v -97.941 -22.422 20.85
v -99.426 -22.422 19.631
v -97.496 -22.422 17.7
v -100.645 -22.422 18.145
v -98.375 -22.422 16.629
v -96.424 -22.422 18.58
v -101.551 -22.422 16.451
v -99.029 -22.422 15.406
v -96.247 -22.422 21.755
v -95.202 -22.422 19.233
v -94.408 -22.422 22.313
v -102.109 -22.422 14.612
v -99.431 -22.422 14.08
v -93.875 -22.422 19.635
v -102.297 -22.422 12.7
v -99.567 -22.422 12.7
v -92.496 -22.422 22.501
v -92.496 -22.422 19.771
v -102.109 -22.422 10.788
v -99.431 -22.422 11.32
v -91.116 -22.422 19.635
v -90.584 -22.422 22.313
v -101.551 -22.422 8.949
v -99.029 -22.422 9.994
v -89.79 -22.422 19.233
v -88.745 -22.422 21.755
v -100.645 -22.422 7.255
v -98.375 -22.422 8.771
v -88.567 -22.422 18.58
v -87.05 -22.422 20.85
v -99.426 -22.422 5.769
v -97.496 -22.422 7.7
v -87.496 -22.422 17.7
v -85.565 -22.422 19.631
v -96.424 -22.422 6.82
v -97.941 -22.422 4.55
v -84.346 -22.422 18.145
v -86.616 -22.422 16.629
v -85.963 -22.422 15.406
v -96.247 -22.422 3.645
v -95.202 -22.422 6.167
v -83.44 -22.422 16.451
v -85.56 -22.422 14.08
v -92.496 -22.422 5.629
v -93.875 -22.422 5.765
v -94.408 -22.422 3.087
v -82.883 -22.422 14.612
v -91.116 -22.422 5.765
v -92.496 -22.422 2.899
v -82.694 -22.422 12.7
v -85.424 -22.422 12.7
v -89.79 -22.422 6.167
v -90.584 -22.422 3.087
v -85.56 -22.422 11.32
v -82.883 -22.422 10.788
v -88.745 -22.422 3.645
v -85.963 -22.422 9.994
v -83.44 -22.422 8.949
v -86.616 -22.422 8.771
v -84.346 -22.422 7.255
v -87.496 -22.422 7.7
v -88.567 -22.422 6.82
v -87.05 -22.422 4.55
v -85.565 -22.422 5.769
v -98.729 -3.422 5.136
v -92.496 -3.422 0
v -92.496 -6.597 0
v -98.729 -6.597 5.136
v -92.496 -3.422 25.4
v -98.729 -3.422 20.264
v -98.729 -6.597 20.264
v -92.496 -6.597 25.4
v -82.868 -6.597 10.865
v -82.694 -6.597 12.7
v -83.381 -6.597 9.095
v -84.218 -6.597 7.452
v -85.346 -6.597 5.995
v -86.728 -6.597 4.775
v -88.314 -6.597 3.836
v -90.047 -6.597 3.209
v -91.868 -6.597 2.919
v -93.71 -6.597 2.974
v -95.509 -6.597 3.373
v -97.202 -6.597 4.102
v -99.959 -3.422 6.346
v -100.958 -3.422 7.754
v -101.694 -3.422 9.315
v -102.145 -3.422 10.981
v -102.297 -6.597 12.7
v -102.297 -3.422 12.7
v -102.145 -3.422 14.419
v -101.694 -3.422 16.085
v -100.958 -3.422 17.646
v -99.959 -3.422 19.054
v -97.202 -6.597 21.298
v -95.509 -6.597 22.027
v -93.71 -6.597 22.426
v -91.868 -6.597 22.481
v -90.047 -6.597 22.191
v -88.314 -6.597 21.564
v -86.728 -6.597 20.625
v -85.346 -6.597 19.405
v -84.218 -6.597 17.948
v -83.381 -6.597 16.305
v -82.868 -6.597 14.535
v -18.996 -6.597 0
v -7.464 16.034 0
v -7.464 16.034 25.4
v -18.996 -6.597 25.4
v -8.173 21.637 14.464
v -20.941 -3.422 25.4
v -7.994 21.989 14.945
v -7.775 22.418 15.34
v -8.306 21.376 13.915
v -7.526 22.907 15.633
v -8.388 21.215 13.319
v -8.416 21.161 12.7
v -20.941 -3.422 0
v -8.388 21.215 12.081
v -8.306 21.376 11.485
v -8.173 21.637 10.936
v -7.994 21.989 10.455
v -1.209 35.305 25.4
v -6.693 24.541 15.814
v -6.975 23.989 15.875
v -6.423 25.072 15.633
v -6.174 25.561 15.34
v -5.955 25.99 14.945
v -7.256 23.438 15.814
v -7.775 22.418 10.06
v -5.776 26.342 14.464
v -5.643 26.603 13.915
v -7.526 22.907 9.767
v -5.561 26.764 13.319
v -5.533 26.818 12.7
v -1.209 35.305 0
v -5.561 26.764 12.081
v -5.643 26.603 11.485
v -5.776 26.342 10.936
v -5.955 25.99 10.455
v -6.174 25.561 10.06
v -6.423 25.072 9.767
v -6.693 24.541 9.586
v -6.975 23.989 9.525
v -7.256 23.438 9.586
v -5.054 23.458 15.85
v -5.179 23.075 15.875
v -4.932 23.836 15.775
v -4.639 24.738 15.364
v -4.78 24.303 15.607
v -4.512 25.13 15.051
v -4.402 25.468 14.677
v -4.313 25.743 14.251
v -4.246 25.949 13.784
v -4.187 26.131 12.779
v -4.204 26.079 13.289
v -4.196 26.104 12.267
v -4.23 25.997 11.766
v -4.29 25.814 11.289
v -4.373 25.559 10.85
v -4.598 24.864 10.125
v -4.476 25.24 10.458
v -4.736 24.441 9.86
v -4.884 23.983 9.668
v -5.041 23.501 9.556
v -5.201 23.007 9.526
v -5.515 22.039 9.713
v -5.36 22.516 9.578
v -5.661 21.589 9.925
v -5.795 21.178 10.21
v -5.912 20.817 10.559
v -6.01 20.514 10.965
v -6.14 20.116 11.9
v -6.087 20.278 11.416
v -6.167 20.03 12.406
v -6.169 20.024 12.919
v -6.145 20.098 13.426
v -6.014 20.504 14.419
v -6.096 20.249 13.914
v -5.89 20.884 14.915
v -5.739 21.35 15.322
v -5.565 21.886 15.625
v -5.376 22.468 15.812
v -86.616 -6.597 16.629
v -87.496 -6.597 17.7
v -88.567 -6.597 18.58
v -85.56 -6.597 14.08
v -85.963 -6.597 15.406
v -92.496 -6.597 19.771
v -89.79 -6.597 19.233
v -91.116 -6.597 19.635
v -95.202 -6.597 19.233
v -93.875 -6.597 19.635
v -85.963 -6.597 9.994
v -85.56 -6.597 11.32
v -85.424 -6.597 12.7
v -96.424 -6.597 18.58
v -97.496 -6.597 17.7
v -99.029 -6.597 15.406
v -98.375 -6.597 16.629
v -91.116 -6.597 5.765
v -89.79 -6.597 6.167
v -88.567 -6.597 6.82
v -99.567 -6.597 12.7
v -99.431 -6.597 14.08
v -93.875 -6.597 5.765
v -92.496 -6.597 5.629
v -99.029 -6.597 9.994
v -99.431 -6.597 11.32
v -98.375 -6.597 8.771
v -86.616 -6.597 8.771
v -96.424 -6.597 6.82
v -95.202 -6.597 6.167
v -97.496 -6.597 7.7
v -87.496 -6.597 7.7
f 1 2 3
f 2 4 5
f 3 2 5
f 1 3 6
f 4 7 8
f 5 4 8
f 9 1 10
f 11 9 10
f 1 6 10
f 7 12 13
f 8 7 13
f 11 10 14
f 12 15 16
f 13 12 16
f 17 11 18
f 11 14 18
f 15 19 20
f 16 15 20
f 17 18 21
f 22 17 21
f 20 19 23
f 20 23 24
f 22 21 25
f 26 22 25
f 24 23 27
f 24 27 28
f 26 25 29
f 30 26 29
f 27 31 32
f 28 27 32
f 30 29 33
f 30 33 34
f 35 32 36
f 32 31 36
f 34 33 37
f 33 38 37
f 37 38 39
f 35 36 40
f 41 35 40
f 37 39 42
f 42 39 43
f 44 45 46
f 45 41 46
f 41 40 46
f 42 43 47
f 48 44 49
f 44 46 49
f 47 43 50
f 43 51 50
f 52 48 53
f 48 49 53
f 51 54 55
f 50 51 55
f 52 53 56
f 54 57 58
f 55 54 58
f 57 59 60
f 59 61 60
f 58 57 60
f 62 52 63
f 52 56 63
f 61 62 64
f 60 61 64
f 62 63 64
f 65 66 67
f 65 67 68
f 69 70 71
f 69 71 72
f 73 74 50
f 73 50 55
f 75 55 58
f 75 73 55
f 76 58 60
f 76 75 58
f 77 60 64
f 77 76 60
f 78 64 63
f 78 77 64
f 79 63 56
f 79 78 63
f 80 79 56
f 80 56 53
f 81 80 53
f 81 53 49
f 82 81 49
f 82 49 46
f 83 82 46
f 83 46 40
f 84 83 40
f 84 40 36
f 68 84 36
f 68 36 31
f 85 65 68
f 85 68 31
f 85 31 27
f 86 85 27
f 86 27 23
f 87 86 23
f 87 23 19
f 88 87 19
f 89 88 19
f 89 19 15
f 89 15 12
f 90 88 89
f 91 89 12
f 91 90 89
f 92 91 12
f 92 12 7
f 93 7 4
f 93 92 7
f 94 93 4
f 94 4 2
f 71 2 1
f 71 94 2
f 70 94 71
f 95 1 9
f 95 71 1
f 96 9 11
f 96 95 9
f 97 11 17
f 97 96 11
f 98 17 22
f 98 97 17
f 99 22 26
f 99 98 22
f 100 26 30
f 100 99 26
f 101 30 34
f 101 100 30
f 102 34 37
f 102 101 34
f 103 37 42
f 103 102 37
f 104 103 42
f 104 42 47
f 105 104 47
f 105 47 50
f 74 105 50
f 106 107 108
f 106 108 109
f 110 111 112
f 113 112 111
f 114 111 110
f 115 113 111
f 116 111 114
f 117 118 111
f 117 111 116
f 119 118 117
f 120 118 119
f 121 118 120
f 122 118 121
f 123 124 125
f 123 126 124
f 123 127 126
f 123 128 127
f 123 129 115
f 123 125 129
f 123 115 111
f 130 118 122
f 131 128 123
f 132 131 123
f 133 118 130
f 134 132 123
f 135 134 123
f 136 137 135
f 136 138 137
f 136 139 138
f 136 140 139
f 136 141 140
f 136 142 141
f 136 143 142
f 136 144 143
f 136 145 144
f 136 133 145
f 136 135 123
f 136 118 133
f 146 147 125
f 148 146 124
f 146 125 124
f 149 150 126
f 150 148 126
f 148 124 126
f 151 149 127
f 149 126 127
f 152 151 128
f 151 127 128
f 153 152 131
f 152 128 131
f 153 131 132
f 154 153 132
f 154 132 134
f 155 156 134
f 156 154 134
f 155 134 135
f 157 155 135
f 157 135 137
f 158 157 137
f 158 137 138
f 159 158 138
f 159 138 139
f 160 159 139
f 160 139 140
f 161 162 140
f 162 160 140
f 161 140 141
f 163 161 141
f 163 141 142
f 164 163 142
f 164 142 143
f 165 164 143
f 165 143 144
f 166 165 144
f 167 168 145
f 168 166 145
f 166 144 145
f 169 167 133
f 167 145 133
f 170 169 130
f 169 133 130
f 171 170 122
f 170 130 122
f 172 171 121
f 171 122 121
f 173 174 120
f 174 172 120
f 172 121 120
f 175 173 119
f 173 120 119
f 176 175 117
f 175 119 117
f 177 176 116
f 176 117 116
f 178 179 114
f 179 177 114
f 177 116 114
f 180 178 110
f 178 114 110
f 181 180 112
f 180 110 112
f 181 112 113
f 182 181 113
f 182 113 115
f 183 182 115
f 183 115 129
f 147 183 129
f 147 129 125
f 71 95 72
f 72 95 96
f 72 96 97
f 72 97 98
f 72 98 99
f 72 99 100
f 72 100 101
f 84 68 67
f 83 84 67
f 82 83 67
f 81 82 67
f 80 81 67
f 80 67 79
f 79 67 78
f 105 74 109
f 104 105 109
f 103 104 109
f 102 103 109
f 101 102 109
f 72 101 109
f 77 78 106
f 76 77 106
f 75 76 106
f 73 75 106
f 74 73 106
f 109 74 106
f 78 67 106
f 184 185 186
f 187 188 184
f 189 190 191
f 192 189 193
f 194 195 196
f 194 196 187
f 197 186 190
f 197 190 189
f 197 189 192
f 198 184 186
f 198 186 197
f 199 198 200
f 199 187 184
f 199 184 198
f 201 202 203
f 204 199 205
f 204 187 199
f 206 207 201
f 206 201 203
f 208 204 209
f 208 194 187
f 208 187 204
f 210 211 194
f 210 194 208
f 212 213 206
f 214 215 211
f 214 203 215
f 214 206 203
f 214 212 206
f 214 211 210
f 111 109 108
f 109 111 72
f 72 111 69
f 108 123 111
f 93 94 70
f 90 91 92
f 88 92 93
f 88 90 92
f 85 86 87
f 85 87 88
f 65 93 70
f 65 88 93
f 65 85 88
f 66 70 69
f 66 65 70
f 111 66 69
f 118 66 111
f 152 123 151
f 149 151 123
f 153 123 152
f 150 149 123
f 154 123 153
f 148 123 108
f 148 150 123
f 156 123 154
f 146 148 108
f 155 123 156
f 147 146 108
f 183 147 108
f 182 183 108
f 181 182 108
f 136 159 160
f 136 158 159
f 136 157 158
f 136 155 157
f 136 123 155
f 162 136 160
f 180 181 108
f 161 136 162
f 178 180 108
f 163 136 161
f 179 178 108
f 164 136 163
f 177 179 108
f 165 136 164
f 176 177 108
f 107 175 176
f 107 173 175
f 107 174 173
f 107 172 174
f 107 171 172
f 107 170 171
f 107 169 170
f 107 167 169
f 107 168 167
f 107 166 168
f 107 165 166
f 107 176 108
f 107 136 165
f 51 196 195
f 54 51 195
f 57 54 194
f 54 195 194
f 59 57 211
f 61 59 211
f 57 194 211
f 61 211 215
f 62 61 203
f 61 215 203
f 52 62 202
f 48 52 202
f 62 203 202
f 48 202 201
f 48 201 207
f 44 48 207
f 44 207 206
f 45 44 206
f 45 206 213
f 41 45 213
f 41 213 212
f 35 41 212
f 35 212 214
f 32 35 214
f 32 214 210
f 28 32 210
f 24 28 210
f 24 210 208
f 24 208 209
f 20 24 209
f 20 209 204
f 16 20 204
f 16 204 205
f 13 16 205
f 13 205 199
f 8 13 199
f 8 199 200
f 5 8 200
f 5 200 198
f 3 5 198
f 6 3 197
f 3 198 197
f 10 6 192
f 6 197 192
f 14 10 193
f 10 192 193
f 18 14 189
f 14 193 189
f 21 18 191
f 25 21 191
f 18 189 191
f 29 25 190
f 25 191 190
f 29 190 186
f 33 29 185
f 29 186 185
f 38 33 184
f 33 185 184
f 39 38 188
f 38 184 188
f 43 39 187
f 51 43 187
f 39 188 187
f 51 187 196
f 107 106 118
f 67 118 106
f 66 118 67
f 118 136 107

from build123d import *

# Parameters (mm, degrees)
BOSS_EXTRUDE1_DEPTH = 25.4
SKETCH2_R           = 9.801448676
SKETCH2_R_2         = 7.071368029
BOSS_EXTRUDE2_DEPTH = 19
BOSS_EXTRUDE3_DEPTH = 3.175
SKETCH4_R           = 3.175
CUT_EXTRUDE1_DEPTH  = 3.175


with BuildPart() as part:
    # Sketch1 → Boss-Extrude1 (new body)
    with BuildSketch(Plane.XY):
        Polygon((-92.495819173, -3.422180745), (-20.941461675, -3.422180745), (-1.20885062, 35.305249012), (-7.464460479, 16.03438497), (-18.995819173, -6.597180745), (-92.495819173, -6.597180745), align=None)
    extrude(amount=BOSS_EXTRUDE1_DEPTH)

    # Sketch2 → Boss-Extrude2 (add)
    with BuildSketch(Plane(origin=(0, -3.422180745, 0), x_dir=(1, 0, 0), z_dir=(0, 1, 0))):
        with Locations((-92.495819173, -12.7)):
            Circle(SKETCH2_R)
        with Locations((-92.495819173, -12.7)):
            Circle(SKETCH2_R_2, mode=Mode.SUBTRACT)
    extrude(amount=-BOSS_EXTRUDE2_DEPTH)

    # Sketch3 → Boss-Extrude3 (add)
    with BuildSketch(Plane(origin=(0, -3.422180745, 0), x_dir=(1, 0, 0), z_dir=(0, 1, 0))):
        with BuildLine():
            Line((-98.728601618, -16.040159995), (-98.728601618, -9.359840005))
            ThreePointArc((-98.728601618, -9.359840005), (-99.567187202, -12.7), (-98.728601618, -16.040159995))
        make_face()
        with BuildLine():
            Line((-98.728601618, -9.359840005), (-98.728601618, -5.135555597))
            Line((-98.728601618, -5.135555597), (-102.297267848, -12.7))
            Line((-102.297267848, -12.7), (-98.728601618, -20.264444403))
            Line((-98.728601618, -20.264444403), (-98.728601618, -16.040159995))
            ThreePointArc((-98.728601618, -16.040159995), (-99.567187202, -12.7), (-98.728601618, -9.359840005))
        make_face()
        with BuildLine():
            ThreePointArc((-92.495819173, -2.898551324), (-95.806852438, -3.474738223), (-98.728601618, -5.135555597))
            Line((-98.728601618, -5.135555597), (-98.728601618, -9.359840005))
            ThreePointArc((-98.728601618, -9.359840005), (-96.12794976, -6.632721104), (-92.495819173, -5.628631971))
            Line((-92.495819173, -5.628631971), (-92.495819173, -2.898551324))
        make_face()
        with BuildLine():
            ThreePointArc((-92.495819173, -19.771368029), (-96.12794976, -18.767278896), (-98.728601618, -16.040159995))
            Line((-98.728601618, -16.040159995), (-98.728601618, -20.264444403))
            ThreePointArc((-98.728601618, -20.264444403), (-95.806852438, -21.925261777), (-92.495819173, -22.501448676))
            Line((-92.495819173, -22.501448676), (-92.495819173, -19.771368029))
        make_face()
        with BuildLine():
            ThreePointArc((-92.495819173, -22.501448676), (-95.806852438, -21.925261777), (-98.728601618, -20.264444403))
            Line((-98.728601618, -20.264444403), (-92.495819173, -25.4))
            Line((-92.495819173, -25.4), (-92.495819173, -22.501448676))
        make_face()
        with BuildLine():
            ThreePointArc((-92.495819173, -5.628631971), (-96.12794976, -6.632721104), (-98.728601618, -9.359840005))
            Line((-98.728601618, -9.359840005), (-98.728601618, -16.040159995))
            ThreePointArc((-98.728601618, -16.040159995), (-96.12794976, -18.767278896), (-92.495819173, -19.771368029))
            Line((-92.495819173, -19.771368029), (-92.495819173, -5.628631971))
        make_face()
        with BuildLine():
            Line((-92.495819173, -2.898551324), (-92.495819173, 0))
            Line((-92.495819173, 0), (-98.728601618, -5.135555597))
            ThreePointArc((-98.728601618, -5.135555597), (-95.806852438, -3.474738223), (-92.495819173, -2.898551324))
        make_face()
    extrude(amount=-BOSS_EXTRUDE3_DEPTH)

    # Sketch4 → Cut-Extrude1 (cut)
    with BuildSketch(Plane(origin=(-15.240970814, 7.765662505, 0), x_dir=(0, 0, 1), z_dir=(-0.891006524, 0.4539905, 0))):
        with Locations((12.7, 18.20840051)):
            Circle(SKETCH4_R)
    extrude(amount=-CUT_EXTRUDE1_DEPTH, mode=Mode.SUBTRACT)


solid = part.part
